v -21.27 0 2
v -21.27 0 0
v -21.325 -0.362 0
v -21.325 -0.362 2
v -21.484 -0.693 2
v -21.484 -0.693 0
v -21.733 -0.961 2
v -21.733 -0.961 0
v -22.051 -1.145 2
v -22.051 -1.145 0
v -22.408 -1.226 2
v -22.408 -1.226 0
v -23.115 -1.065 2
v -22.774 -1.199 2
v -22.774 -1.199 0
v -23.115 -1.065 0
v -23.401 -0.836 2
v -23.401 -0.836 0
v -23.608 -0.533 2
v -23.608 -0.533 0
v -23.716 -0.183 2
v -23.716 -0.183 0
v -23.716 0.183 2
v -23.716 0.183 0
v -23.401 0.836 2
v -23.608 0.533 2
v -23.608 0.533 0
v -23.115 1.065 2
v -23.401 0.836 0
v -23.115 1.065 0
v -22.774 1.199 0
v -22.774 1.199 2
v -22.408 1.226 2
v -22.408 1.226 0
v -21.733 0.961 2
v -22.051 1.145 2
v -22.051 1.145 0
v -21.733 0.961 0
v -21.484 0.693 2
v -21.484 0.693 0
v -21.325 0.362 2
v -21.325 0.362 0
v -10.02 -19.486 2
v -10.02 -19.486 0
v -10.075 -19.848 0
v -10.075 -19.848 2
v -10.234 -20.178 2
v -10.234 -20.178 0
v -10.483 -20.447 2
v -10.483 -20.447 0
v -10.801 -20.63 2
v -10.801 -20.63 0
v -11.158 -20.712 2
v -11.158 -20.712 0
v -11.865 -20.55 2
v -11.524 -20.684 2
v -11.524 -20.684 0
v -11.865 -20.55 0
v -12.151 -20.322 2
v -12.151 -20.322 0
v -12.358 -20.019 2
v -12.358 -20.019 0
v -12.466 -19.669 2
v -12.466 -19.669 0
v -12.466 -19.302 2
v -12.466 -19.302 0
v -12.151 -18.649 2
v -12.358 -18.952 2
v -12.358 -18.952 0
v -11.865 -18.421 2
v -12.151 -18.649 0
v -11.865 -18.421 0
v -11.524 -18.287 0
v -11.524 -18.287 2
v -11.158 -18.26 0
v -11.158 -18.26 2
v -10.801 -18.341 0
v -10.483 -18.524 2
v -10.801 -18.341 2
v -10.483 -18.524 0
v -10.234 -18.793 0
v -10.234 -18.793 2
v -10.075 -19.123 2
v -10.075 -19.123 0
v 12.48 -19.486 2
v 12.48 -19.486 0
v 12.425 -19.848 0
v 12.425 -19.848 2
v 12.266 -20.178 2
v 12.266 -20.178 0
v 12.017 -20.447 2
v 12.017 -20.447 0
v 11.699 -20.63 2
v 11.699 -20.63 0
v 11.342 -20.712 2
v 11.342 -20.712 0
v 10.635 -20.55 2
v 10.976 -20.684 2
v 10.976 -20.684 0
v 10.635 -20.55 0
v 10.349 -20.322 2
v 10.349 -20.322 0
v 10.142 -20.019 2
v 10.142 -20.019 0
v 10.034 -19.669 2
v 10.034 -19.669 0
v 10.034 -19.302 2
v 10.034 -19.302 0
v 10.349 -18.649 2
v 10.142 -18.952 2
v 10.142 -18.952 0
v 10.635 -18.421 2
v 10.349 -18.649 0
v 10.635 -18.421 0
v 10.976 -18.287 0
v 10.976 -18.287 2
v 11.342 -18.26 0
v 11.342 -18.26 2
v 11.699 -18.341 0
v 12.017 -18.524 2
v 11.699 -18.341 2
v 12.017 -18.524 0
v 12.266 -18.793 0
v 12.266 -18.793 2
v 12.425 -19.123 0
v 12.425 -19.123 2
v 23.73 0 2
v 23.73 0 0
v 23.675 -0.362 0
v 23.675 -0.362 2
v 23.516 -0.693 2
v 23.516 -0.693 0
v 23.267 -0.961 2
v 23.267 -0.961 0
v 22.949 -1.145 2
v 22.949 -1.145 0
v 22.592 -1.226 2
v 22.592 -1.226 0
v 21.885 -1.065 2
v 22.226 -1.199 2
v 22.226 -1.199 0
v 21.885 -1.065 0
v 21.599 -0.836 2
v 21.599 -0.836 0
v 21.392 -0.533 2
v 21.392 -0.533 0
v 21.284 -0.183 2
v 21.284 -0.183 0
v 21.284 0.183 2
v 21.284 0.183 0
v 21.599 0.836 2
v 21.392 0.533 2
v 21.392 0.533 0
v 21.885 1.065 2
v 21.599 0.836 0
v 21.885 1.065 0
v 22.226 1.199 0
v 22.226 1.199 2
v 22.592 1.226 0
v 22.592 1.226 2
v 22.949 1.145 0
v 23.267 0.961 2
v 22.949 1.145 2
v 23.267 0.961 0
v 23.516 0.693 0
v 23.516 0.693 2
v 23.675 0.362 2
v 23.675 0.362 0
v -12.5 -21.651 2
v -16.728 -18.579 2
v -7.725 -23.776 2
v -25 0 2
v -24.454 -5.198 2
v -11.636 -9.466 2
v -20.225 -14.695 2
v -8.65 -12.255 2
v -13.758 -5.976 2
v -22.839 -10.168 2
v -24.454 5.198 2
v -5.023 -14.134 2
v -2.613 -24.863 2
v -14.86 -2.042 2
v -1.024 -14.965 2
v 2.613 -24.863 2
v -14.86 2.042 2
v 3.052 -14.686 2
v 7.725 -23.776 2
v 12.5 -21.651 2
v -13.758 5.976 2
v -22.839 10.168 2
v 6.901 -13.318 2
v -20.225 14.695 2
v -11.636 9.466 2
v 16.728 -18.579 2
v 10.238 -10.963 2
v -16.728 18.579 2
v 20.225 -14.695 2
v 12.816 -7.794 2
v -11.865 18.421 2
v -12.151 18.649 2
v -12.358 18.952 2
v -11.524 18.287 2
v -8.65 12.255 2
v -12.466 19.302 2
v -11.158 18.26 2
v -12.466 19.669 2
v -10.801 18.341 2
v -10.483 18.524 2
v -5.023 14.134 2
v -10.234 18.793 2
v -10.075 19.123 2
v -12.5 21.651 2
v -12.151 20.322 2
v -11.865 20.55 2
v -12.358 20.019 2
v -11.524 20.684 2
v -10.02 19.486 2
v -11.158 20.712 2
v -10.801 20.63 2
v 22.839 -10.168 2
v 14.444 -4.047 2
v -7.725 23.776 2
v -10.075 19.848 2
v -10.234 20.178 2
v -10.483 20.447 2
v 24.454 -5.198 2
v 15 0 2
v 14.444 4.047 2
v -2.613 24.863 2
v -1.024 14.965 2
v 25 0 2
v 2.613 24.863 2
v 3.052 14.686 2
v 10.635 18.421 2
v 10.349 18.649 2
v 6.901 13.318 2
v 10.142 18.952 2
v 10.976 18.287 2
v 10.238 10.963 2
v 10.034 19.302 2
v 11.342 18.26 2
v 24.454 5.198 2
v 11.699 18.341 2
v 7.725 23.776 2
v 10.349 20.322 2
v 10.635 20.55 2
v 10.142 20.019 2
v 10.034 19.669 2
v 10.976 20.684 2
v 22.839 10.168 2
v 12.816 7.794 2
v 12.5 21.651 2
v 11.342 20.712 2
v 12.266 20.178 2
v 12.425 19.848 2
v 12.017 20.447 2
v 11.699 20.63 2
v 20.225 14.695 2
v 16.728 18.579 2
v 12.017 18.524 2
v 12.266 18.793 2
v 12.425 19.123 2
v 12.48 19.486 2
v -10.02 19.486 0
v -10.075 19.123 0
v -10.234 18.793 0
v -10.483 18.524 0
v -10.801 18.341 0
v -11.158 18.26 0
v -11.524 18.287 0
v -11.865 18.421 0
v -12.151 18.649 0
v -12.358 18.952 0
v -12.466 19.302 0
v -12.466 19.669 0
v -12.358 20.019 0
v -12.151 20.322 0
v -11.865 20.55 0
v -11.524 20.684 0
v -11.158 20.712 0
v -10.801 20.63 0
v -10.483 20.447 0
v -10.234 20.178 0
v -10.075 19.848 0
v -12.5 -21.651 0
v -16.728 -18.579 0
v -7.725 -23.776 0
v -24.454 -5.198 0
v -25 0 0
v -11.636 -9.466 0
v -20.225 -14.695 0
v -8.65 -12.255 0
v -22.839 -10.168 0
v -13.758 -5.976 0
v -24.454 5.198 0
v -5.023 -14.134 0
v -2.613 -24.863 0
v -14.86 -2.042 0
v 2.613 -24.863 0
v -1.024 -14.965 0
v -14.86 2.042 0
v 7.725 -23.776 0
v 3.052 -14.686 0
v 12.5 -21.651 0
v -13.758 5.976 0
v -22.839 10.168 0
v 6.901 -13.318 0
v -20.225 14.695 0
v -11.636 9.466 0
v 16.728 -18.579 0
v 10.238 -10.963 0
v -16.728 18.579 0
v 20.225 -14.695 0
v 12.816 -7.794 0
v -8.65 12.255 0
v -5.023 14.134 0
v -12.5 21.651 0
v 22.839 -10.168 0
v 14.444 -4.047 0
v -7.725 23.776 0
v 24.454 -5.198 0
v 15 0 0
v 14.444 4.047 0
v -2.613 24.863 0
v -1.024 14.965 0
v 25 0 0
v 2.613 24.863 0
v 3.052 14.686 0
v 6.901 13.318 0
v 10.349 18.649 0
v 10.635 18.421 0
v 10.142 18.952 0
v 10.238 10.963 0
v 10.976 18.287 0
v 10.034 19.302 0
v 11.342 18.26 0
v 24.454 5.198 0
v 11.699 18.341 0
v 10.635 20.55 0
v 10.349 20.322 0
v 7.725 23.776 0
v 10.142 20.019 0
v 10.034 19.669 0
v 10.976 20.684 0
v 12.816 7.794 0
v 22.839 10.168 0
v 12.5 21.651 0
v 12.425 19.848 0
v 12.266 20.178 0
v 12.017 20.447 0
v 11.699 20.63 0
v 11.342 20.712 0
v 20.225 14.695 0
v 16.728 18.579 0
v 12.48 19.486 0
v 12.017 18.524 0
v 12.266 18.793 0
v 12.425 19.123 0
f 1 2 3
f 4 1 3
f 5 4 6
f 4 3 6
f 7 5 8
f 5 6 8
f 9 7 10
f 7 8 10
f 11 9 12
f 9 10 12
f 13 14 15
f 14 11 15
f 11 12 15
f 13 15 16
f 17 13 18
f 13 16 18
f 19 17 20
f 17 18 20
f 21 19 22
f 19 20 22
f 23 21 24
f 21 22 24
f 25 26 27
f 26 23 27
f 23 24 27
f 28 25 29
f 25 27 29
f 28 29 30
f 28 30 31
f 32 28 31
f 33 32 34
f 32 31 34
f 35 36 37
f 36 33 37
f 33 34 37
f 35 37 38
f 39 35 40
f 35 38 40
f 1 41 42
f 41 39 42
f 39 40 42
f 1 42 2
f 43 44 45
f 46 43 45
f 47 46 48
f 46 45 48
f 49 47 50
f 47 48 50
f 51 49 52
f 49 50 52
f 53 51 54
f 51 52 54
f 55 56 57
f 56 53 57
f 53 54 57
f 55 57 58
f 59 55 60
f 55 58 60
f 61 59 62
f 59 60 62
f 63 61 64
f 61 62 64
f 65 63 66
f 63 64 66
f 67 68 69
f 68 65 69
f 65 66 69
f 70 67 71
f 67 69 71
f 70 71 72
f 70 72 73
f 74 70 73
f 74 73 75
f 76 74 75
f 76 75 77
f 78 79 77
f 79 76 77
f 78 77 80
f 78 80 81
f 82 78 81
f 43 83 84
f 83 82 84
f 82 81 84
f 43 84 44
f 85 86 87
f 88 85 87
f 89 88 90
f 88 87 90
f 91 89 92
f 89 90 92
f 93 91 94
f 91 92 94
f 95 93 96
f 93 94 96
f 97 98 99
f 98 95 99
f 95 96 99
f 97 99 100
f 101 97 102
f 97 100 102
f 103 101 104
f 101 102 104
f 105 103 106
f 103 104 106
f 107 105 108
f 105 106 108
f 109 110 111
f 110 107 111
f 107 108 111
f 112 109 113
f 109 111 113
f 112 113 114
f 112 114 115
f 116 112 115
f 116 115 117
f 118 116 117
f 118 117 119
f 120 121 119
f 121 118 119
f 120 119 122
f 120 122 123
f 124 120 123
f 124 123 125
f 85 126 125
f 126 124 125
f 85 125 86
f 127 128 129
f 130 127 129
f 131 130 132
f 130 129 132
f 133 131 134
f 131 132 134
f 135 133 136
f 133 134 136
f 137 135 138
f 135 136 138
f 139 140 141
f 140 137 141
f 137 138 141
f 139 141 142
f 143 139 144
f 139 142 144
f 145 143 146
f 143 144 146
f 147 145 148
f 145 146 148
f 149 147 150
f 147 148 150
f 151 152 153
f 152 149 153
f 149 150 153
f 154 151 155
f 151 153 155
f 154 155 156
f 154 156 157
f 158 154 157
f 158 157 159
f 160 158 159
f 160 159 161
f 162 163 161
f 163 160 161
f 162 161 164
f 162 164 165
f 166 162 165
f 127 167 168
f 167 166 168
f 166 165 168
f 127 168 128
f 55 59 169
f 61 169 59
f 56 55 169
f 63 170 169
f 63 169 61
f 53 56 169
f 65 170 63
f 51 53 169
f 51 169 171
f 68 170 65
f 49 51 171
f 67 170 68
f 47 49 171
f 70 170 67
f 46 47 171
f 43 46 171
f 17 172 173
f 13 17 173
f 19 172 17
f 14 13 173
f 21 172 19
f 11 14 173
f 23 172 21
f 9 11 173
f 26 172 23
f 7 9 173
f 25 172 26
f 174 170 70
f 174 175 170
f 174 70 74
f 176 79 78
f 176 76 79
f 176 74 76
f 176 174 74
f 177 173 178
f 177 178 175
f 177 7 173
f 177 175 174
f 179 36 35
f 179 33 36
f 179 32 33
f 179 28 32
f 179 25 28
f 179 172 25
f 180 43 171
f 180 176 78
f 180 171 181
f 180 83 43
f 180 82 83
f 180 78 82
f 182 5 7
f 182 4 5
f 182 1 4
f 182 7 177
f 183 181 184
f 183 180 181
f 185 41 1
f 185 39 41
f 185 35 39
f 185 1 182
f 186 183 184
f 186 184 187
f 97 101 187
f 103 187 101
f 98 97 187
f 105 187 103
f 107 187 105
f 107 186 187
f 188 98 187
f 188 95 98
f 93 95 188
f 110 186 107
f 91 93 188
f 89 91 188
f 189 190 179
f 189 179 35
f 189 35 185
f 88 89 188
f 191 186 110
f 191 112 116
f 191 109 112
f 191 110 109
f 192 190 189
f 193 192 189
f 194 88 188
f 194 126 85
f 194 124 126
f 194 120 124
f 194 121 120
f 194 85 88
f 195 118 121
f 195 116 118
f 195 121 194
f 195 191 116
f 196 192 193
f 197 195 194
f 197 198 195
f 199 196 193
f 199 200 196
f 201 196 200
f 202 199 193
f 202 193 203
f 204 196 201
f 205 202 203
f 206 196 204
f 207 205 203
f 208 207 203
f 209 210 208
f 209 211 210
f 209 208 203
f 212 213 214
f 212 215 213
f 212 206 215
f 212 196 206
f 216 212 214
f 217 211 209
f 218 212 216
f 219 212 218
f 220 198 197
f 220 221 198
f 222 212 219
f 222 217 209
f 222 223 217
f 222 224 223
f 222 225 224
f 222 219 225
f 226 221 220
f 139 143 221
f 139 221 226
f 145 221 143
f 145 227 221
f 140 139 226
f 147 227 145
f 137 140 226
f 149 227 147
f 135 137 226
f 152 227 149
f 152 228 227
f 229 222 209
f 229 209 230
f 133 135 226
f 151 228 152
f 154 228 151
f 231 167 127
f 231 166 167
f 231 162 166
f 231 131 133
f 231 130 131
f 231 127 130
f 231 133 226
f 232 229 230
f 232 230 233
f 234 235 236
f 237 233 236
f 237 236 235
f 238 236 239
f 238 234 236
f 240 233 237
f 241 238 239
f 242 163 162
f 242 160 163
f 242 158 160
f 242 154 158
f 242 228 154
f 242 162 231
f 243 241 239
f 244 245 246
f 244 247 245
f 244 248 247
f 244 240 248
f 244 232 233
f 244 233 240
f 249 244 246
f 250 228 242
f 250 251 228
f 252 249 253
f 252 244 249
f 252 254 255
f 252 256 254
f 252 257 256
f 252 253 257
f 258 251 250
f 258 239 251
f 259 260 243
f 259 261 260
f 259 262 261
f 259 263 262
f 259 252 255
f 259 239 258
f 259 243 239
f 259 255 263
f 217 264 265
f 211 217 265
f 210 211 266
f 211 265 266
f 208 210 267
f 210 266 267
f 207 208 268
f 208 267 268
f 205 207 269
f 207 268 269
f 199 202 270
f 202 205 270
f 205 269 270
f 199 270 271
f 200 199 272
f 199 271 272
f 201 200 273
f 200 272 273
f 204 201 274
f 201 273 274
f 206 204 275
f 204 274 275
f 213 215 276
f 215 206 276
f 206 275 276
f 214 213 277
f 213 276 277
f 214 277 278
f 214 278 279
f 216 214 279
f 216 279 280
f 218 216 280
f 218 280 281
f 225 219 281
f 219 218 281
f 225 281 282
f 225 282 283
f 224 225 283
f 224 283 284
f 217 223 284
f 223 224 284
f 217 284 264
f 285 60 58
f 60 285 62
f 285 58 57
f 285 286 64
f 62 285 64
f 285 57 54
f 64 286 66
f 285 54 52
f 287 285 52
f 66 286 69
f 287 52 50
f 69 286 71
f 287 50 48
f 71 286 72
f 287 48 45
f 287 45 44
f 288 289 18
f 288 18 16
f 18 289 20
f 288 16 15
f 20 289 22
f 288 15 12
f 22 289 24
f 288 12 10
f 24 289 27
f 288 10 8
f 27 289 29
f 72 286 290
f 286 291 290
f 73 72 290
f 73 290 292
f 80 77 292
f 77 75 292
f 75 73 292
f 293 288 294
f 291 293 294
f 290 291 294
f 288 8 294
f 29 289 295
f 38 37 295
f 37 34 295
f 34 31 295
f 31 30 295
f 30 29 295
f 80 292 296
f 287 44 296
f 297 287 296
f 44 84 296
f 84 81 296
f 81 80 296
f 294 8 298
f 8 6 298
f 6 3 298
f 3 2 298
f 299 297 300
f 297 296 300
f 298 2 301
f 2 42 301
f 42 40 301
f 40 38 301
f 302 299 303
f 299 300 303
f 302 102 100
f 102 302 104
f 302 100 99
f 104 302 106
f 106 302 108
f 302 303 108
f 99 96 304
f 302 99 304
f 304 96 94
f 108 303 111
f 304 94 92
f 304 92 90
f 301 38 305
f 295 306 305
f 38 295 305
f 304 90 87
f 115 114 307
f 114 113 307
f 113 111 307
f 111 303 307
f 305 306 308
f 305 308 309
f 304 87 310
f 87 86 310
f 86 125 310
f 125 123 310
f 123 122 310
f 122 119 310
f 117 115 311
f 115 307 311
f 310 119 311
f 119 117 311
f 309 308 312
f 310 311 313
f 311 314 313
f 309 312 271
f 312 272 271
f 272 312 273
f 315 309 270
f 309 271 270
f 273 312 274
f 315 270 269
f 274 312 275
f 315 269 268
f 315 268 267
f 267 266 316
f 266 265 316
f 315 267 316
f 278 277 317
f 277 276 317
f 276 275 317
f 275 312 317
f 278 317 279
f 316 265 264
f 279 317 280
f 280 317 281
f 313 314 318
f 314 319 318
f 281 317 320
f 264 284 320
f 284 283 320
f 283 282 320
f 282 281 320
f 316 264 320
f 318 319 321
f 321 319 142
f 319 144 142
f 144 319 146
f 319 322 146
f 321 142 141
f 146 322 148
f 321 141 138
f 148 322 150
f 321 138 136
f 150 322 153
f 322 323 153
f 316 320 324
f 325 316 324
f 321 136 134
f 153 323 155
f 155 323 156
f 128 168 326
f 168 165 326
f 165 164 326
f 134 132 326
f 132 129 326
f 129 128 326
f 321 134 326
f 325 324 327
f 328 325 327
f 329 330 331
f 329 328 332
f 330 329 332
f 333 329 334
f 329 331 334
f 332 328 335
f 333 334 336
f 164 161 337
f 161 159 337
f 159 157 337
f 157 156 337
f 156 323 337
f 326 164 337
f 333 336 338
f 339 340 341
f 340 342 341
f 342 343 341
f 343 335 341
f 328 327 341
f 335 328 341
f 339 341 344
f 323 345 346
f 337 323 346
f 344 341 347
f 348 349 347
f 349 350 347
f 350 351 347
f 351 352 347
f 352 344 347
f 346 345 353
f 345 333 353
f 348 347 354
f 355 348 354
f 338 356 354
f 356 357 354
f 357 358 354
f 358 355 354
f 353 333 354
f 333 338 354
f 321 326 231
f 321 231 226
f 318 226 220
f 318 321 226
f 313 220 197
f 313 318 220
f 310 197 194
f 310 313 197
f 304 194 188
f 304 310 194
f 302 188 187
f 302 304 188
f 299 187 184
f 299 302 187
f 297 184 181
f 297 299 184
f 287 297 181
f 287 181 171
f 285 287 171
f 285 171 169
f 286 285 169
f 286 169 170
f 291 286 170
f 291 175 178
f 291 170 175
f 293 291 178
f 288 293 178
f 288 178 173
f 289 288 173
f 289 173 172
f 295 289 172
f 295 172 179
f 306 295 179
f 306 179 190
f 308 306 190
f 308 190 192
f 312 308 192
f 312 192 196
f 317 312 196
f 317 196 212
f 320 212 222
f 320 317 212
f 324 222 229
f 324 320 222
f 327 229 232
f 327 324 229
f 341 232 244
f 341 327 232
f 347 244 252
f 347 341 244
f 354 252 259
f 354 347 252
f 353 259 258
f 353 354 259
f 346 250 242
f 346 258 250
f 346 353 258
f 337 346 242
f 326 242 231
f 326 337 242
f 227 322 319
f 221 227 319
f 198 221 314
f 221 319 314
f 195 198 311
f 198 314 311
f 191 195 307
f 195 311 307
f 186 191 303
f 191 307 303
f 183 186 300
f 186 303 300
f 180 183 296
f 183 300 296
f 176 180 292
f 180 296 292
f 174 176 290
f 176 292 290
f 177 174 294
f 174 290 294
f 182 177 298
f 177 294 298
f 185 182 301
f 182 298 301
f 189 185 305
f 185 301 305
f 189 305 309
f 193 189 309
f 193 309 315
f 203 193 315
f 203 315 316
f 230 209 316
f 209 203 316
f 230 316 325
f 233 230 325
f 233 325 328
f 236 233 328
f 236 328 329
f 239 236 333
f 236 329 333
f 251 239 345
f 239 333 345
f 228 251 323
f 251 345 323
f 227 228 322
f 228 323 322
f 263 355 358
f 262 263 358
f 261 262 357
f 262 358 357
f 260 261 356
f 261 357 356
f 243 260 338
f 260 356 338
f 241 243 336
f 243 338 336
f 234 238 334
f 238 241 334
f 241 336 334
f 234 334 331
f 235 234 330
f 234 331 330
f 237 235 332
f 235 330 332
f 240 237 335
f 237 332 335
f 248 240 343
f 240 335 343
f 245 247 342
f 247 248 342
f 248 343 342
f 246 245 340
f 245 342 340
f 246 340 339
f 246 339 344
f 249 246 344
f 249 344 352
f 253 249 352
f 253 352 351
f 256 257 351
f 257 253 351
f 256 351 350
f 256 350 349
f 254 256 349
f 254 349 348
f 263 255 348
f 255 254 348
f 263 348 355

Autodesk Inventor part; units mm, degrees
ref_plane "YZ Plane" through (0, 0, 0) normal (1, 0, 0) x (0, 1, 0)
ref_plane "XZ Plane" through (0, 0, 0) normal (0, 1, 0) x (-1, 0, 0)
ref_plane "XY Plane" through (0, 0, 0) normal (0, 0, 1) x (1, 0, 0)
sketch "Sketch2" plane through (0, 0, 0) normal (0, 0, 1) x (1, 0, 0)
  circle A0 centre (-22.5, 0) radius 1.2295 projected
  circle A1 centre (11.25, -19.4856) radius 1.2295 projected
  circle A2 centre (11.25, 19.4856) radius 1.2295 projected
  circle A3 centre (22.5, 0) radius 1.2295 projected
  circle A4 centre (-11.25, -19.4856) radius 1.2295 projected
  circle A5 centre (-11.25, 19.4856) radius 1.2295 projected
  circle A6 centre (0, 0) radius 25 projected
  circle A7 centre (0, 0) radius 16 projected
  circle A8 centre (0, 0) radius 15 projected
  point P0 (0, 0)
extrude "Extrusion1" add sketch "Sketch2" along normal blind 2 contours A6 | A7
properties part number "P019-Joint_chambre_chapeau" material "Polytetrafluoroethylene"
